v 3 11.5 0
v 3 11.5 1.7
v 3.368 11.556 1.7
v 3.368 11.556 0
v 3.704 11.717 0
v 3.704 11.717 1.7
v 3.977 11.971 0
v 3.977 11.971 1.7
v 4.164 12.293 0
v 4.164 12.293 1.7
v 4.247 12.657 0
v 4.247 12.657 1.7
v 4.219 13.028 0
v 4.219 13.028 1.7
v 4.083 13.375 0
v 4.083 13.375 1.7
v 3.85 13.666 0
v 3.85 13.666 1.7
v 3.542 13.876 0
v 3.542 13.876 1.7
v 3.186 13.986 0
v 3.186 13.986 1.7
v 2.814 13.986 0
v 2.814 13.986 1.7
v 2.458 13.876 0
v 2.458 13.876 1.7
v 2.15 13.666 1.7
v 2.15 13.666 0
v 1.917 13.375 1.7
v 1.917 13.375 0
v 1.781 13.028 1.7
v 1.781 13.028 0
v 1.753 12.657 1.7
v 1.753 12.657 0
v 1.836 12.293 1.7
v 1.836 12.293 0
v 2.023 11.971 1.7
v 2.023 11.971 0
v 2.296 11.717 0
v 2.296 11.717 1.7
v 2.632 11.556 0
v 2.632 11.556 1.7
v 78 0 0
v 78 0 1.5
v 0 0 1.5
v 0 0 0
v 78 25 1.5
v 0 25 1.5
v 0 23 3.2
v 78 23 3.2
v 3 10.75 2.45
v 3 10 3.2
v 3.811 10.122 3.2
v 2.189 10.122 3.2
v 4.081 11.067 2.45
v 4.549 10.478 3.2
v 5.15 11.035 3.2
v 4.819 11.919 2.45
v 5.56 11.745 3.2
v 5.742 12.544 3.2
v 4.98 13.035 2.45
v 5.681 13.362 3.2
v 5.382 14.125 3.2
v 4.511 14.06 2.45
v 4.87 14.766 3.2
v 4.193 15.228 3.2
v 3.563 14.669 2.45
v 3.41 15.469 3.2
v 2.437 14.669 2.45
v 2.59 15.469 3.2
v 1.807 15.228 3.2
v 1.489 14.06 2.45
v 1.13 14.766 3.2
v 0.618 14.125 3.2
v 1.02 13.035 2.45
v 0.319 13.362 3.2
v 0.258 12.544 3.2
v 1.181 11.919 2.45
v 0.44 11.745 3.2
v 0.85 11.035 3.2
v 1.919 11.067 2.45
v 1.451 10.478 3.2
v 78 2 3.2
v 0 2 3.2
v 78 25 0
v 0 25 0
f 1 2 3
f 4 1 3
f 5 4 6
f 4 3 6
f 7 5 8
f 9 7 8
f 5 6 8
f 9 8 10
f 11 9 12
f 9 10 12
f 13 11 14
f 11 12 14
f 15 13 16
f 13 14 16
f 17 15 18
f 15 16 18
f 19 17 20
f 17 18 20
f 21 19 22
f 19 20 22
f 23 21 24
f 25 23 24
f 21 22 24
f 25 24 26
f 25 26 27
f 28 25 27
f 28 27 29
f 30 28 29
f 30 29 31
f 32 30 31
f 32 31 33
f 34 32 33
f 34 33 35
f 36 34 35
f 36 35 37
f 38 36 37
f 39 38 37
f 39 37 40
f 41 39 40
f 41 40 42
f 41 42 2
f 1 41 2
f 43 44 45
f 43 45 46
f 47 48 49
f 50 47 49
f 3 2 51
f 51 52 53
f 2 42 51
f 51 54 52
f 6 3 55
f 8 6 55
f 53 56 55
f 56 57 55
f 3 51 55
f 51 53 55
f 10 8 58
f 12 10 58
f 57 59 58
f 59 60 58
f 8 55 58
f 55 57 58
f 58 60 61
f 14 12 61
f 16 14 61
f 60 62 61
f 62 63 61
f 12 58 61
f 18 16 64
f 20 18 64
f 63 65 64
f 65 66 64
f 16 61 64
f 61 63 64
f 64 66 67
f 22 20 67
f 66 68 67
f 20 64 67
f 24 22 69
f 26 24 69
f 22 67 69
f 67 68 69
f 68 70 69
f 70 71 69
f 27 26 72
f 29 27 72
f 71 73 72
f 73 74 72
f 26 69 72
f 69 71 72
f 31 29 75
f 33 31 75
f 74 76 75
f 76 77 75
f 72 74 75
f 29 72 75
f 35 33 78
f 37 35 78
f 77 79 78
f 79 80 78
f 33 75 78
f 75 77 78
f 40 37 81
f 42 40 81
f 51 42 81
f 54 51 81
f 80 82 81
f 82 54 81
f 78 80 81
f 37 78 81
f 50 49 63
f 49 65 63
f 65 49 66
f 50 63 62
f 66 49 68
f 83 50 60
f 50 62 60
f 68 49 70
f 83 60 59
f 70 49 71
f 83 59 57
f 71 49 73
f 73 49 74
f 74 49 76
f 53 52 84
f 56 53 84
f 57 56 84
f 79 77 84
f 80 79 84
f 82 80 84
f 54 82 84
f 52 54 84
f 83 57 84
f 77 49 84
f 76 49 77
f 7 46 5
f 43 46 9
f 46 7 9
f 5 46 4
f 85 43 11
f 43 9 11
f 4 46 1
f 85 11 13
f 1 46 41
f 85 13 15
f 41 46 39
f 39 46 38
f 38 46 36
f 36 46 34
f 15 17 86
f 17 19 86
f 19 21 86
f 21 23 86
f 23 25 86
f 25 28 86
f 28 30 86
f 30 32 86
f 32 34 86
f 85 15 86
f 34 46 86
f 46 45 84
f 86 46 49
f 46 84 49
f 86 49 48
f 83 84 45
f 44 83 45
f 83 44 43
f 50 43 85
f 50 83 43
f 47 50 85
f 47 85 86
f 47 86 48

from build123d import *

# Parameters (mm, degrees)
PAD_DEPTH    = 78
SKETCH001_R  = 1.25
POCKET_DEPTH = 5
CHAMFER_SIZE = 1.5


with BuildPart() as part:
    # Sketch → Pad (new body)
    with BuildSketch(Plane.YZ):
        Polygon((0, 0), (25, 0), (25, 1.5), (23, 3.2), (2, 3.2), (0, 1.5), align=None)
    extrude(amount=PAD_DEPTH)

    # Sketch001 (on Face4 of Pad) → Pocket (cut)
    with BuildSketch(Plane(origin=(0, 0, 3.2), x_dir=(0, -1, 0), z_dir=(0, 0, 1))):
        with Locations((-12.75, 3)):
            Circle(SKETCH001_R)
    extrude(amount=-POCKET_DEPTH, mode=Mode.SUBTRACT)

    # Chamfer
    chamfer_edges = [part.edges().sort_by_distance(p)[0] for p in [
        (3, 14, 3.2),
    ]]
    chamfer(chamfer_edges, length=CHAMFER_SIZE)


solid = part.part
